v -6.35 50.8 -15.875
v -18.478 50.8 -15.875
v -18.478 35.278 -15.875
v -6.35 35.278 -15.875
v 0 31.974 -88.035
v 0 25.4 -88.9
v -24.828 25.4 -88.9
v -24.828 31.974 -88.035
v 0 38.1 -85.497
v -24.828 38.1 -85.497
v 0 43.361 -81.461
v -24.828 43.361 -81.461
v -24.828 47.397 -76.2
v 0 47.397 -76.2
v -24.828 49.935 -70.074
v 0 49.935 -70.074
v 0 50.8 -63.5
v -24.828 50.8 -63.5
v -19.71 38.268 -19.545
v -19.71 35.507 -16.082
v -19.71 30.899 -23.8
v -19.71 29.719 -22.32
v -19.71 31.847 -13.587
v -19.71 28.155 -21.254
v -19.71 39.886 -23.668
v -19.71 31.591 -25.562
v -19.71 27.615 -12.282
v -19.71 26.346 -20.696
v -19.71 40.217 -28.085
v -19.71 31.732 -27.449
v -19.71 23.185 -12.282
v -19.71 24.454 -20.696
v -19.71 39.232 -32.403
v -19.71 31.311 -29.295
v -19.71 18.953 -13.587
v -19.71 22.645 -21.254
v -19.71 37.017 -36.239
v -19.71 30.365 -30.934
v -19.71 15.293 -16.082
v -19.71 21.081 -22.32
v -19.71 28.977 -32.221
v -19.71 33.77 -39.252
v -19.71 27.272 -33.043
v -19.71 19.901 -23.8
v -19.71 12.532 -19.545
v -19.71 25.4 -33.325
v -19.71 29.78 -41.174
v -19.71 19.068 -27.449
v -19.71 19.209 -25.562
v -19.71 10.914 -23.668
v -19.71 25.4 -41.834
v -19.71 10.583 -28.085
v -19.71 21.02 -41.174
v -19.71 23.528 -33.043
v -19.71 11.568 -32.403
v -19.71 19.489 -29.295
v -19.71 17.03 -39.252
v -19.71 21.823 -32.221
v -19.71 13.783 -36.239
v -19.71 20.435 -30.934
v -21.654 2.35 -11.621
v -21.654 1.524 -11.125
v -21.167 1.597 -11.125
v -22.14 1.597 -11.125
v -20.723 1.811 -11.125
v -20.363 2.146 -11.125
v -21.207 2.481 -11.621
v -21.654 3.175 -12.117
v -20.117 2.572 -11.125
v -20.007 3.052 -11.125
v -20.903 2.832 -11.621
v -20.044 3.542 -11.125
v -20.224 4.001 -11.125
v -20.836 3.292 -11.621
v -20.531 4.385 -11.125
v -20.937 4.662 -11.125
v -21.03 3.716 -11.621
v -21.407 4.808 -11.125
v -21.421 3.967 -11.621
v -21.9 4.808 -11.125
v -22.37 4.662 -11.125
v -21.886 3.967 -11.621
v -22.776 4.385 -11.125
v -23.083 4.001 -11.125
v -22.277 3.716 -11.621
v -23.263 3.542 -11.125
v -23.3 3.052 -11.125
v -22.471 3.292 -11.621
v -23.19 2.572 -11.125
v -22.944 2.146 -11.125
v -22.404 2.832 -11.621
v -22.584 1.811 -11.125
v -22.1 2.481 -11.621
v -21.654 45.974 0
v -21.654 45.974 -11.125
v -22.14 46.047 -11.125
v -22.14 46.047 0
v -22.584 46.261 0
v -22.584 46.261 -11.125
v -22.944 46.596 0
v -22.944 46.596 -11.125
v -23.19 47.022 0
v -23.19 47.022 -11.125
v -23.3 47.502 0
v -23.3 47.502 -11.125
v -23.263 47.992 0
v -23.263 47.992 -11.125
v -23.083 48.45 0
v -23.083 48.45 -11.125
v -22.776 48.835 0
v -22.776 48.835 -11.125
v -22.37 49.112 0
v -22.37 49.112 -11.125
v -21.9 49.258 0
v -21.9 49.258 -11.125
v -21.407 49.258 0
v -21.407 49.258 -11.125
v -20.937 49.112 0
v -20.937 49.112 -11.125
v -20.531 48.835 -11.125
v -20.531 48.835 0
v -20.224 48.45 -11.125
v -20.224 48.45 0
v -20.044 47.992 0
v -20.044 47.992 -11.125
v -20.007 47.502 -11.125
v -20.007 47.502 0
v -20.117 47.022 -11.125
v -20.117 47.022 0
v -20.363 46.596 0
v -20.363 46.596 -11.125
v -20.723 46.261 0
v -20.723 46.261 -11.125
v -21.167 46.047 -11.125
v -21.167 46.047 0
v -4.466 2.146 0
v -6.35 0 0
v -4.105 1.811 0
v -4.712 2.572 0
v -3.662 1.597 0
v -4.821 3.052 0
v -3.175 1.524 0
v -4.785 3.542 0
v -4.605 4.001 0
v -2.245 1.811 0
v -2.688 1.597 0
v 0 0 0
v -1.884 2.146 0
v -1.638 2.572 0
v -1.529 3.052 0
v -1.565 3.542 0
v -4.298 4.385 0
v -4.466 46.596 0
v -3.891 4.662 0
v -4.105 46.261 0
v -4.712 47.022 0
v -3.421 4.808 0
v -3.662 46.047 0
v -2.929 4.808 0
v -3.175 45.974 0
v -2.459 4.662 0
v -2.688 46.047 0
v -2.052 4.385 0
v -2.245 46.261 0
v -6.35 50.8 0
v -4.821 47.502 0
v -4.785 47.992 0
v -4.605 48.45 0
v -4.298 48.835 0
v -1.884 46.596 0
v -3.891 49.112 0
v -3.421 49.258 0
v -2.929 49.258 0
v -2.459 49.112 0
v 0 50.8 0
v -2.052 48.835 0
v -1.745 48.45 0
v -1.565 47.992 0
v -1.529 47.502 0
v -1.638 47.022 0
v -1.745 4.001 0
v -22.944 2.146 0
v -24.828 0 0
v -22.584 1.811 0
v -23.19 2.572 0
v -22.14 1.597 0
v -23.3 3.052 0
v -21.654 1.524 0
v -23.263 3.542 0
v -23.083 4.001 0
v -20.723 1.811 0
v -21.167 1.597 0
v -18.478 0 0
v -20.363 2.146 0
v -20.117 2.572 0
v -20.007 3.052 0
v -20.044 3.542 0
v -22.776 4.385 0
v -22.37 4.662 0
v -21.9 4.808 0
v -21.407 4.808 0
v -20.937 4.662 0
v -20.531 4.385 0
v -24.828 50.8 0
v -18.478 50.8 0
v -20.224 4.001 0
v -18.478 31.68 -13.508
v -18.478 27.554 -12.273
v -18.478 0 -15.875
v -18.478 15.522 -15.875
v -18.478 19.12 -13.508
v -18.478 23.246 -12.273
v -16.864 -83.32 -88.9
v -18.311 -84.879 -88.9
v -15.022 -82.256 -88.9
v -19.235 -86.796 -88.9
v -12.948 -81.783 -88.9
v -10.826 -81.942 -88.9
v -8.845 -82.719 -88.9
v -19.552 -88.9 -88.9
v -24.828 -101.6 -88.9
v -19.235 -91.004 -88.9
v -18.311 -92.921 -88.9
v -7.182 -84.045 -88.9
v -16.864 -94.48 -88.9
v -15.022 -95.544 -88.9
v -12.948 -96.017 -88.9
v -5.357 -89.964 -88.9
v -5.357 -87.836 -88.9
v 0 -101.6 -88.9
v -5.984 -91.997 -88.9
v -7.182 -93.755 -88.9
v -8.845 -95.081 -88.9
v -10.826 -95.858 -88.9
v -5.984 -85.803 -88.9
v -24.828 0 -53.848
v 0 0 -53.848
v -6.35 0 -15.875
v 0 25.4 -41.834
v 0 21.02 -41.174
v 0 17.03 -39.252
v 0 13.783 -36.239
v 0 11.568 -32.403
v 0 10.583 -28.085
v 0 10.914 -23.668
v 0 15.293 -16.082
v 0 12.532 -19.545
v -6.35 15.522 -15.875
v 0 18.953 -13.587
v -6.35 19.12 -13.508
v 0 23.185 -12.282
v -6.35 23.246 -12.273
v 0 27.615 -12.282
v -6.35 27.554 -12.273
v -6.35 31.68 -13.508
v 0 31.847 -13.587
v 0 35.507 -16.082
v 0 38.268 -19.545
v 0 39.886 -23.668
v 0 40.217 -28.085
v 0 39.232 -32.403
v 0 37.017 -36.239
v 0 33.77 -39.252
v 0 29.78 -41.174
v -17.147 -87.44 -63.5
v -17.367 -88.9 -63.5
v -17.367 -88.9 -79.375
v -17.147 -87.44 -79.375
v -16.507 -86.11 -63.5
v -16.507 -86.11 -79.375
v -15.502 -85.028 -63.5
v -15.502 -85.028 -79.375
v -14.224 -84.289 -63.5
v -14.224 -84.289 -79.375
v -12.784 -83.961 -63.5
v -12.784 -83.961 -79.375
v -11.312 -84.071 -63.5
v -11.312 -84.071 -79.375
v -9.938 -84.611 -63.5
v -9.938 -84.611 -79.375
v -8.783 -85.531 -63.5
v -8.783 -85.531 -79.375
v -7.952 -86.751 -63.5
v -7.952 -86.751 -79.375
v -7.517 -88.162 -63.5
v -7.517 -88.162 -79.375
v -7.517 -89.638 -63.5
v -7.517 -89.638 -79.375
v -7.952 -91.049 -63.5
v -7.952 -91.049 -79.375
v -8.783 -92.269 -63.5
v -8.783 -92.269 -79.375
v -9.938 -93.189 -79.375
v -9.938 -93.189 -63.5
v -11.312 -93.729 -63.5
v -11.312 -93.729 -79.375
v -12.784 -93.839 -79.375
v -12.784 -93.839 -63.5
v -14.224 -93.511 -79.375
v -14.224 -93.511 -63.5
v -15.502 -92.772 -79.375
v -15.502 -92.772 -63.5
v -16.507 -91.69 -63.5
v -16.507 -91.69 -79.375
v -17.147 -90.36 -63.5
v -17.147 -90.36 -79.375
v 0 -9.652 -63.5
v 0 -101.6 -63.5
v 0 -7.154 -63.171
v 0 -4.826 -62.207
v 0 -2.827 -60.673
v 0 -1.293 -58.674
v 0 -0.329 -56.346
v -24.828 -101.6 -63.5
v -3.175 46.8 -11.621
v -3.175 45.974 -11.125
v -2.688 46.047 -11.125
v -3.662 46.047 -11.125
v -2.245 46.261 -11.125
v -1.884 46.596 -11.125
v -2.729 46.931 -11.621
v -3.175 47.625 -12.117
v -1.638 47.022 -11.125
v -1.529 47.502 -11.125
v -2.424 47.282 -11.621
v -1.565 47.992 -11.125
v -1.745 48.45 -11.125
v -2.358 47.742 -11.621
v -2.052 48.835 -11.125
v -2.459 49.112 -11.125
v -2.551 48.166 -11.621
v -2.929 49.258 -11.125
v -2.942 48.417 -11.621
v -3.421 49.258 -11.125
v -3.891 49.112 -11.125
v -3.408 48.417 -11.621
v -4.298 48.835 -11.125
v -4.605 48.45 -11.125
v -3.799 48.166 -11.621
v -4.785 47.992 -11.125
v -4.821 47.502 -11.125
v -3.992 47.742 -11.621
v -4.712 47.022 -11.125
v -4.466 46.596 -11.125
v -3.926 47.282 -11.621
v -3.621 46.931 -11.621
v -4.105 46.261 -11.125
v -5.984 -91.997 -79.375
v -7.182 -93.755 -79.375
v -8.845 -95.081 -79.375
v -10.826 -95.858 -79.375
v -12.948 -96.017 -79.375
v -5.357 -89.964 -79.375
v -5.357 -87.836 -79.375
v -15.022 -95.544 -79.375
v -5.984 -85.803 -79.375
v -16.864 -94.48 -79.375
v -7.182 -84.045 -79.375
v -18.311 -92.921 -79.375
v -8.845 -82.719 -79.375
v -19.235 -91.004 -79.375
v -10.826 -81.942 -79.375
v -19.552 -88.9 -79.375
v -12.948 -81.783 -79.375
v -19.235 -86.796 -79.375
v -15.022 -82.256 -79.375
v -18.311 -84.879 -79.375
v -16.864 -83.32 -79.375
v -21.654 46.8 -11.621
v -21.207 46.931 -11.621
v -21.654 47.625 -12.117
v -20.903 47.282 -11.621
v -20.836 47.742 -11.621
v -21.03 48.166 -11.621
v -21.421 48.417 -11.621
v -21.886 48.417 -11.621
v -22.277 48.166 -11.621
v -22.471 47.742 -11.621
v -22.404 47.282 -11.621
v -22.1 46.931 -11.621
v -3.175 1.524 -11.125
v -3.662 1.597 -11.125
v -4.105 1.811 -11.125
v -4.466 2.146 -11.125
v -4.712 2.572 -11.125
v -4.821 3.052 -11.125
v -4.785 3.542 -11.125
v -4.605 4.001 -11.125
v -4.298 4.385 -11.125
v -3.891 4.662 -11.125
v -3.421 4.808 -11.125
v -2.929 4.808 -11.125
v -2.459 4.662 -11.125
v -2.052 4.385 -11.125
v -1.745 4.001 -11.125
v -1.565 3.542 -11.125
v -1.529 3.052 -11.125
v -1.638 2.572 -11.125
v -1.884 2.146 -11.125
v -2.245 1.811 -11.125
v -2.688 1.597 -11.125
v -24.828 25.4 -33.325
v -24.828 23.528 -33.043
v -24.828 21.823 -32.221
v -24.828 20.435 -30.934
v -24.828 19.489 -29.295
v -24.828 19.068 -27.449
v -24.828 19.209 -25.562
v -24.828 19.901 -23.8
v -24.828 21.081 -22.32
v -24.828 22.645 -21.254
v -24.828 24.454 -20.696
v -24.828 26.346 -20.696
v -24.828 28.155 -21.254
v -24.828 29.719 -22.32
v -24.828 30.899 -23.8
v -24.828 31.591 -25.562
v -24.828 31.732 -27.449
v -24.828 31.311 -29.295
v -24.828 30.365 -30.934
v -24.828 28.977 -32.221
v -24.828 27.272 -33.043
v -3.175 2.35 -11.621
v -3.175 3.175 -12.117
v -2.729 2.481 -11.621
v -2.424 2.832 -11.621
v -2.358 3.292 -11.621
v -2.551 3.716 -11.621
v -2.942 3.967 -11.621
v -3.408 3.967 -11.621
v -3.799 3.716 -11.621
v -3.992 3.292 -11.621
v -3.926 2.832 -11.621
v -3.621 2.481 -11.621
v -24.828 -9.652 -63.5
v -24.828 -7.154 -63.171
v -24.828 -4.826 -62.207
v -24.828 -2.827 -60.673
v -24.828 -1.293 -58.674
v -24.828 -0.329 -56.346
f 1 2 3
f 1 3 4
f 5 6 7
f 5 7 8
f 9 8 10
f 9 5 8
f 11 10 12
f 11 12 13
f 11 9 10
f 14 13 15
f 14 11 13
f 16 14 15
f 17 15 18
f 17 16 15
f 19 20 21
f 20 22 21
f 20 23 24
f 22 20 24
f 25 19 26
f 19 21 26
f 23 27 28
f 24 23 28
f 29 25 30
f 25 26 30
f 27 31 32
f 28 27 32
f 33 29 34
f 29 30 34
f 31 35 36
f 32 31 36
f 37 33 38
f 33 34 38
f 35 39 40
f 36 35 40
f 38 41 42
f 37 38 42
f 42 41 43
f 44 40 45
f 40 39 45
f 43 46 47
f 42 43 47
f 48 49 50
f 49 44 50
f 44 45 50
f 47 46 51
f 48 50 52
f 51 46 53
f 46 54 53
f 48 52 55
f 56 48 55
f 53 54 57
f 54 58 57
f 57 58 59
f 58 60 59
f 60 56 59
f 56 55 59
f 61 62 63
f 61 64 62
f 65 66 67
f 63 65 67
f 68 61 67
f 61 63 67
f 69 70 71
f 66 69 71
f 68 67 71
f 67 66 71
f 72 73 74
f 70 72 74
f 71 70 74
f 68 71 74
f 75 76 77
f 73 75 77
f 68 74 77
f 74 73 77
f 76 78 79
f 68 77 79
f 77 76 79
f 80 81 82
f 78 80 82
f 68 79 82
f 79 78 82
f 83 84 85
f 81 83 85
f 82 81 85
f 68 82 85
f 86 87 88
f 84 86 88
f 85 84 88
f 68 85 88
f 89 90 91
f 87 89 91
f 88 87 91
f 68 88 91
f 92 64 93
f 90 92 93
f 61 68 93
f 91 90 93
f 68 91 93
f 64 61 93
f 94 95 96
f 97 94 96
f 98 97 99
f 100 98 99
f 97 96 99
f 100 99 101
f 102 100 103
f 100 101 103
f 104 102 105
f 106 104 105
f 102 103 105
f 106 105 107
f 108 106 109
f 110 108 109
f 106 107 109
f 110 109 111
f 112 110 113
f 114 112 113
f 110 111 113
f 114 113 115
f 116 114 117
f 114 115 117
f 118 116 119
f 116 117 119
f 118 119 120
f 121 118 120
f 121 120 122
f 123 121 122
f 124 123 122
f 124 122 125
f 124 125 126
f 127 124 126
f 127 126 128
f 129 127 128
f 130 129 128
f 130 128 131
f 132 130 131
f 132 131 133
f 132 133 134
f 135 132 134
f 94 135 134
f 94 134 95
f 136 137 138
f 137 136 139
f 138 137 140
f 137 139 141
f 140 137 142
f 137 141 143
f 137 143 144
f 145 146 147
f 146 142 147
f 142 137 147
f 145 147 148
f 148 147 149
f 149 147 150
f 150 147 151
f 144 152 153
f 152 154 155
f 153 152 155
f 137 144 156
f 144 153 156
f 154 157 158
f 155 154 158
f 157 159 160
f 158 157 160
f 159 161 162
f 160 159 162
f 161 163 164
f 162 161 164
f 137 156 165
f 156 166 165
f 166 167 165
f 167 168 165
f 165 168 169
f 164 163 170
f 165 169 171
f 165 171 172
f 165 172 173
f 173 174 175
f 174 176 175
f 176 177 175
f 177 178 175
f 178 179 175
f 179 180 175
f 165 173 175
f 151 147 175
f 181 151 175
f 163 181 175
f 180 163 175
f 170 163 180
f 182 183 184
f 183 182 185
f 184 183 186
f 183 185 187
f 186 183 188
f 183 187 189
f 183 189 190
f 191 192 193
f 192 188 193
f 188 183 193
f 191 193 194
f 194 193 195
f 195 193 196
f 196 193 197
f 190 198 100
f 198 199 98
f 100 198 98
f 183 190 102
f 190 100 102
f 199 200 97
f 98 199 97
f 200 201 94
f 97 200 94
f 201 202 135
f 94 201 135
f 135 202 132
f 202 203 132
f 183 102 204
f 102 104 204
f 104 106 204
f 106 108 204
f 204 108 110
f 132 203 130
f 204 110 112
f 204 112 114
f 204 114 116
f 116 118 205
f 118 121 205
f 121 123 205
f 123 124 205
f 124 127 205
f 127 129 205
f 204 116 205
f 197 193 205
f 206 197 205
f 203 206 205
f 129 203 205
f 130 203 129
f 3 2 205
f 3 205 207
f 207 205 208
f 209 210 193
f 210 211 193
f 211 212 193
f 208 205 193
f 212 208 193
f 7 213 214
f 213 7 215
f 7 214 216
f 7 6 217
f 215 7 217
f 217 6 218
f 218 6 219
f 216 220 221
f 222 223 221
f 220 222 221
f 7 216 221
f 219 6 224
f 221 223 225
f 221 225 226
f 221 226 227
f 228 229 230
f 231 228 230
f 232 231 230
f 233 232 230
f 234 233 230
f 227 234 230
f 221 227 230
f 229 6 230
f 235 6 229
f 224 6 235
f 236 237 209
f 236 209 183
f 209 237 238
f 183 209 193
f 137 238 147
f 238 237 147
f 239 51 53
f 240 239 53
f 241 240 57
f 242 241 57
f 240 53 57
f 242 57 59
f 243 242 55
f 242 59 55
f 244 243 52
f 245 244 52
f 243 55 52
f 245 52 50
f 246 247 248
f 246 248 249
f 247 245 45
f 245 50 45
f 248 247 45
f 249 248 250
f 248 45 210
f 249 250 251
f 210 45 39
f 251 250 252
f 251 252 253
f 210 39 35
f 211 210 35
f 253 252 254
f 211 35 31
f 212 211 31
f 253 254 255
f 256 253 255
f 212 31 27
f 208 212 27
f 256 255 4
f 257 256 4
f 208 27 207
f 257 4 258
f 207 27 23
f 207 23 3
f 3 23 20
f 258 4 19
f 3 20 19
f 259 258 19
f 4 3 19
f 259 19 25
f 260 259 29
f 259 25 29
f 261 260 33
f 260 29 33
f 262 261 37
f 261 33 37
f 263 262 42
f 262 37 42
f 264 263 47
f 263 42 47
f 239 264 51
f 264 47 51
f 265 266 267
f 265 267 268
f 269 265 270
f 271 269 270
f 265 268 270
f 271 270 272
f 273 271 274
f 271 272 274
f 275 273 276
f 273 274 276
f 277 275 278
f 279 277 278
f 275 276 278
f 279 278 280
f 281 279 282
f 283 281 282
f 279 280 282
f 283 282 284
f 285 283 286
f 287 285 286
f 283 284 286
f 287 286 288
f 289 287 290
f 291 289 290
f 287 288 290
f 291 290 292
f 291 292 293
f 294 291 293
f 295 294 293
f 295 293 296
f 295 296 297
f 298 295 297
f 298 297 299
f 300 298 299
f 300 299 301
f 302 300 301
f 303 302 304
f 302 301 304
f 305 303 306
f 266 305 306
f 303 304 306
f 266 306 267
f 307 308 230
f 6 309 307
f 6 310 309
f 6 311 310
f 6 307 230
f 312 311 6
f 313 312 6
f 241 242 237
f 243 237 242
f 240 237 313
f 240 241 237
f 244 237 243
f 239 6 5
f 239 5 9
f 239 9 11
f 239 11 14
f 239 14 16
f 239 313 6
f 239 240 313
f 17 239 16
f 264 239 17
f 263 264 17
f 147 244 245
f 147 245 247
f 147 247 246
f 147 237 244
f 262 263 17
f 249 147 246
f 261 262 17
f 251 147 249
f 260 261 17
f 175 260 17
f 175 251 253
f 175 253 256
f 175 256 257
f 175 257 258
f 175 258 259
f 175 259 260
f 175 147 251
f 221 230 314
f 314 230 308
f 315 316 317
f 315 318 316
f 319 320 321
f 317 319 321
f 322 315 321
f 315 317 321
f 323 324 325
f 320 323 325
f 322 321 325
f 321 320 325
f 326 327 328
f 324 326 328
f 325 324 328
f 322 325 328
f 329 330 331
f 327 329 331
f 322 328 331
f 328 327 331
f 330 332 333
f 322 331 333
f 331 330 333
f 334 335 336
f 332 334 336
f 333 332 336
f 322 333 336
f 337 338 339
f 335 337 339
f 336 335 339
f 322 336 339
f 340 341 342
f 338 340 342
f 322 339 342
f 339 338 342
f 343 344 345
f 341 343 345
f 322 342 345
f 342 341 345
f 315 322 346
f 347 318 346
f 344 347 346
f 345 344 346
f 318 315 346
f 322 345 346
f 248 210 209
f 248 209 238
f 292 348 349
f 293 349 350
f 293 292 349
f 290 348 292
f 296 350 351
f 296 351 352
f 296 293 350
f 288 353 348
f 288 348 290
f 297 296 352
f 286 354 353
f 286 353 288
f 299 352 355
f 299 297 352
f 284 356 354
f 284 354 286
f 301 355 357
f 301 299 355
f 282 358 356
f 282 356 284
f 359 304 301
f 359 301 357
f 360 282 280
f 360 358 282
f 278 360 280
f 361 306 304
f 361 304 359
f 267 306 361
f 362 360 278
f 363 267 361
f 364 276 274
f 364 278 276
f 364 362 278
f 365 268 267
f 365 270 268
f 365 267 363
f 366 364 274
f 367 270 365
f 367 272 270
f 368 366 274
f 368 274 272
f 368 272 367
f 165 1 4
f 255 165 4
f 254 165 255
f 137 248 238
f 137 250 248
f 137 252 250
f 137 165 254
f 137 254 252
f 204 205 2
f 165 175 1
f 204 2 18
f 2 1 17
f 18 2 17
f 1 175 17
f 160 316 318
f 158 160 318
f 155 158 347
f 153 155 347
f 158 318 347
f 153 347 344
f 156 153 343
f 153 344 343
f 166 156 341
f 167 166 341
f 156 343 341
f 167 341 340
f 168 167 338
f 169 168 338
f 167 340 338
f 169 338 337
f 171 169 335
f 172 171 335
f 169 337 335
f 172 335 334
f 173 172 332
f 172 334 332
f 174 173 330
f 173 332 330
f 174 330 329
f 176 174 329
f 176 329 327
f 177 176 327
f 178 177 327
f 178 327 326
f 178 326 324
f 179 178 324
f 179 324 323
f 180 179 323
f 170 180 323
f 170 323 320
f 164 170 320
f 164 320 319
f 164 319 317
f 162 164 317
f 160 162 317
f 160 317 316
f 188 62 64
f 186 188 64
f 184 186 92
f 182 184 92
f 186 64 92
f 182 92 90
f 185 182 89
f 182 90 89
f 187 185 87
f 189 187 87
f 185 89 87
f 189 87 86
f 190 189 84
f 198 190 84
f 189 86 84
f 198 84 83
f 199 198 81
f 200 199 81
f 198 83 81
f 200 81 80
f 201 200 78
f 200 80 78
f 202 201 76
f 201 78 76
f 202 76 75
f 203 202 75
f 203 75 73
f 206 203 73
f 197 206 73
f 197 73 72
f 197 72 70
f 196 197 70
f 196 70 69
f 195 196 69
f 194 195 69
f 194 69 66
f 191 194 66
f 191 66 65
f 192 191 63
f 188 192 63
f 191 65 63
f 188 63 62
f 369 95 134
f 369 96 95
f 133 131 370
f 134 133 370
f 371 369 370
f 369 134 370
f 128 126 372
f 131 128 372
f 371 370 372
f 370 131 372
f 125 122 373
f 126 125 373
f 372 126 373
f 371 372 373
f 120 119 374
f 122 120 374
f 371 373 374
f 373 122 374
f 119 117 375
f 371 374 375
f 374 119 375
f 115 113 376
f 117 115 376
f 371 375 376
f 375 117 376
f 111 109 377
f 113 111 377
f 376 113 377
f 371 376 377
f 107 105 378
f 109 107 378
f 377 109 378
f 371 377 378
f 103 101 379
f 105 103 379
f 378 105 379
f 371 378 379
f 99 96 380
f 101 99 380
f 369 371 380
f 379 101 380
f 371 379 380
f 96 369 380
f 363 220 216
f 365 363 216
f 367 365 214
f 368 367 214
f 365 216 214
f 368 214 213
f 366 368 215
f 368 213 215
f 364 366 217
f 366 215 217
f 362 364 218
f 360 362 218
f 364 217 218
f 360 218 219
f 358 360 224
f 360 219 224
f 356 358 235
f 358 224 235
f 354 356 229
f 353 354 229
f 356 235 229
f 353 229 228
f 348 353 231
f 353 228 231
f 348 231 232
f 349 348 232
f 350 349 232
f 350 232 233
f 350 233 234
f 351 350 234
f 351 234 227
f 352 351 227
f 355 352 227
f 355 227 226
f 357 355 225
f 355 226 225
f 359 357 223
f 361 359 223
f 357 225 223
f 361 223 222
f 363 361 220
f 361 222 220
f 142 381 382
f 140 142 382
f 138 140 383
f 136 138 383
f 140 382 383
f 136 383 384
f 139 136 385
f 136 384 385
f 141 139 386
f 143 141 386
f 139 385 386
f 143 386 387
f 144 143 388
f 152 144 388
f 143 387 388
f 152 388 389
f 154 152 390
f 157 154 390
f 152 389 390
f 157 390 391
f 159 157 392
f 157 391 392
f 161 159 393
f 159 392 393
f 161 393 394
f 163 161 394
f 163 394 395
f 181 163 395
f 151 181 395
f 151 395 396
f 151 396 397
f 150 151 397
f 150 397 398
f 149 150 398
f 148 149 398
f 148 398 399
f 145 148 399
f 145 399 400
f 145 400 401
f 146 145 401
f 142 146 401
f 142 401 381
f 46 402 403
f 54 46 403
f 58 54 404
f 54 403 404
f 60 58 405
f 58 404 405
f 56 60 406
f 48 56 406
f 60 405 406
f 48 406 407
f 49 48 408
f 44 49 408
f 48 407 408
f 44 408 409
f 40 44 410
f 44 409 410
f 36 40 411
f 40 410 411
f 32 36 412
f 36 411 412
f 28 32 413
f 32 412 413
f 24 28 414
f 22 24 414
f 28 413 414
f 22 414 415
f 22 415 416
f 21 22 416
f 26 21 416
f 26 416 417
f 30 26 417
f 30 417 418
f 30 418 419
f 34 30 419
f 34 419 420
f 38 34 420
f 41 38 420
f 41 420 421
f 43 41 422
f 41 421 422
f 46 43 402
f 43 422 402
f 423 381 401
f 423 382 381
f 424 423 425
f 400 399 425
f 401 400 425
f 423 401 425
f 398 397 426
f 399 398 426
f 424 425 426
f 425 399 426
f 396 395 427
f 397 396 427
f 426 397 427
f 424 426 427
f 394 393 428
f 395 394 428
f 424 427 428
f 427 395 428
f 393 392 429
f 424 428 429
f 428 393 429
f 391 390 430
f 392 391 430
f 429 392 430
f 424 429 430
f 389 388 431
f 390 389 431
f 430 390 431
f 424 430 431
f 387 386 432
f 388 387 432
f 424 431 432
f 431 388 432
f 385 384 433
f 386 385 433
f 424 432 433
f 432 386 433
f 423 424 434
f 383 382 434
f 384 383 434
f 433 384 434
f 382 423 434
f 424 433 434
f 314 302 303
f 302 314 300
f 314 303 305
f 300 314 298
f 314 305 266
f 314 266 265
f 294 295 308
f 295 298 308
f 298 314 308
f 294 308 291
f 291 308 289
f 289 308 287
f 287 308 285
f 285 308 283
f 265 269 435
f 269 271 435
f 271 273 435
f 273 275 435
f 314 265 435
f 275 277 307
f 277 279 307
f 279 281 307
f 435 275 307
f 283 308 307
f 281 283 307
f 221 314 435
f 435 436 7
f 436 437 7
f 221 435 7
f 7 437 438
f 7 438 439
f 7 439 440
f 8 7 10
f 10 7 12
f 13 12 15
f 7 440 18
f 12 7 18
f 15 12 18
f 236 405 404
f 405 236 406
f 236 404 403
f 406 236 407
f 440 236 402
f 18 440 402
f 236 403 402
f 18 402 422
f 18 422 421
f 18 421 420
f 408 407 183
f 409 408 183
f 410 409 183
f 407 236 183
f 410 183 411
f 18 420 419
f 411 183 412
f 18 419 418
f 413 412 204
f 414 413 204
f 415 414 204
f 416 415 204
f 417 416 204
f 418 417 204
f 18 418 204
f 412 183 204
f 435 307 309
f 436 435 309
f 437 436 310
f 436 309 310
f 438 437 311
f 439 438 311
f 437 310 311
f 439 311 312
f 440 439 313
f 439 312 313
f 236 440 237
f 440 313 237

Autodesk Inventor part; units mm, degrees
ref_plane "YZ Plane" through (0, 0, 0) normal (1, 0, 0) x (0, 1, 0)
ref_plane "XZ Plane" through (0, 0, 0) normal (0, 1, 0) x (-1, 0, 0)
ref_plane "XY Plane" through (0, 0, 0) normal (0, 0, 1) x (1, 0, 0)
sketch "Sketch1" plane through (0, 0, 0) normal (1, 0, 0) x (0, 1, 0)
  line L0 (0, -112.9926) -> (0, 18.8321) projected
  line L1 (-133.1321, 0) -> (87.5926, 0) projected
  line L2 (0, 0) -> (50.8, 0)
  line L3 (50.8, 0) -> (50.8, -63.5)
  line L4 (25.4, -88.9) -> (-101.6, -88.9)
  line L5 (-101.6, -88.9) -> (-101.6, -63.5)
  line L6 (-101.6, -63.5) -> (-9.652, -63.5)
  line L7 (0, 0) -> (0, -53.848)
  arc A0 (25.4, -88.9) -> (50.8, -63.5) centre (25.4, -63.5) ccw
  arc A1 (-9.652, -63.5) -> (0, -53.848) centre (-9.652, -53.848) ccw
  point P0 (50.8, -88.9)
  point P1 (0, -63.5)
  dimension "d0" = 50.8
  dimension "d1" = 88.9
  dimension "d2" = 152.4
  dimension "d3" = 25.4
  dimension "d4" = 25.4
  dimension "d5" = 9.652
extrude "Extrusion1" add sketch "Sketch1" against normal blind 24.8285
sketch "Sketch6" plane through (0, -101.6, -88.9) normal (0, 0, -1) x (-1, 0, 0)
  circle A0 centre (12.4142, 12.7) radius 4.953
  line L0 (0, 0) -> (24.8285, 0) projected
  point P0 (0, 101.6)
  point P1 (12.4142, 0)
  dimension "d16" = 9.906
  dimension "d17" = 12.7
extrude "Extrusion4" cut sketch "Sketch6" against normal through all
sketch "Sketch7" plane through (0, -101.6, -88.9) normal (0, 0, -1) x (-1, 0, 0)
  circle A0 centre (12.4142, 12.7) radius 7.1374
  circle A1 centre (12.4142, 12.7) radius 4.953 projected
  point P0 (0, 101.6)
  dimension "d20" = 14.2748
extrude "Extrusion5" cut sketch "Sketch7" against normal blind 9.525
sketch "Sketch8" plane through (0, 0, 0) normal (0, 0, 1) x (1, 0, 0)
  line L0 (0, 0) -> (-24.8285, 0) projected
  line L1 (-6.35, 50.8) -> (-6.35, 0)
  line L2 (-18.4785, 50.8) -> (-18.4785, 0)
  line L3 (0, 25.4) -> (0, 50.8) projected
  line L4 (-6.35, 50.8) -> (0, 50.8)
  line L5 (0, 0) -> (0, -9.652) projected
  line L6 (0, 50.8) -> (0, 0)
  line L7 (0, 0) -> (-6.35, 0)
  line L8 (-24.8285, 50.8) -> (-18.4785, 50.8)
  line L9 (-24.8285, 0) -> (-18.4785, 0)
  line L10 (-24.8285, 0) -> (-24.8285, 50.8) projected
  line L11 (-18.4785, 50.8) -> (-6.35, 50.8)
  line L12 (0, 50.8) -> (-24.8285, 50.8) projected
  line L13 (-18.4785, 0) -> (-6.35, 0)
  line L14 (0, 0) -> (-24.8285, 0) projected
  dimension "d23" = 6.35
  dimension "d24" = 6.35
extrude "Extrusion6" cut sketch "Sketch8" against normal blind 15.875 contours L0 L2 L11 L1
sketch "Sketch9" plane through (-24.8285, 0, 0) normal (0, 0, 1) x (1, 0, 0)
  line L0 (6.35, 50.8) -> (0, 50.8) projected
  line L1 (24.8285, 50.8) -> (18.4785, 50.8) projected
  line L2 (24.8285, 0) -> (18.4785, 0) projected
  line L3 (6.35, 0) -> (0, 0) projected
  point P0 (3.175, 47.625)
  point P1 (21.6535, 47.625)
  point P2 (21.6535, 3.175)
  point P3 (3.175, 3.175)
  point P4 (3.175, 50.8)
  point P5 (21.6535, 50.8)
  point P6 (21.6535, 0)
  dimension "d27" = 3.175
  dimension "d28" = 3.175
hole "Hole1" at (-21.6535, 47.625, 0) at (-3.175, 47.625, 0) at (-3.175, 3.175, 0) at (-21.6535, 3.175, 0) direction (0, 0, -1) diameter 3.302 depth 11.1252 tip angle 118 thread size "8-32 UNC" class "2B" standard "ANSI Unified Screw Threads"
sketch "Sketch10" plane through (0, 0, 0) normal (1, 0, 0) x (0, 0, -1)
  line L0 (0, 50.8) -> (0, 0) projected
  point P0 (26.9748, 25.4)
  point P1 (0, 25.4)
  dimension "d36" = 26.9748
hole "Hole2" at (0, 25.4, -26.9748) direction (-1, 0, 0) diameter 12.7 end through all counterbore diameter 29.718 counterbore depth 19.7104
properties part number "Ch7(5) Part 13 Column"
